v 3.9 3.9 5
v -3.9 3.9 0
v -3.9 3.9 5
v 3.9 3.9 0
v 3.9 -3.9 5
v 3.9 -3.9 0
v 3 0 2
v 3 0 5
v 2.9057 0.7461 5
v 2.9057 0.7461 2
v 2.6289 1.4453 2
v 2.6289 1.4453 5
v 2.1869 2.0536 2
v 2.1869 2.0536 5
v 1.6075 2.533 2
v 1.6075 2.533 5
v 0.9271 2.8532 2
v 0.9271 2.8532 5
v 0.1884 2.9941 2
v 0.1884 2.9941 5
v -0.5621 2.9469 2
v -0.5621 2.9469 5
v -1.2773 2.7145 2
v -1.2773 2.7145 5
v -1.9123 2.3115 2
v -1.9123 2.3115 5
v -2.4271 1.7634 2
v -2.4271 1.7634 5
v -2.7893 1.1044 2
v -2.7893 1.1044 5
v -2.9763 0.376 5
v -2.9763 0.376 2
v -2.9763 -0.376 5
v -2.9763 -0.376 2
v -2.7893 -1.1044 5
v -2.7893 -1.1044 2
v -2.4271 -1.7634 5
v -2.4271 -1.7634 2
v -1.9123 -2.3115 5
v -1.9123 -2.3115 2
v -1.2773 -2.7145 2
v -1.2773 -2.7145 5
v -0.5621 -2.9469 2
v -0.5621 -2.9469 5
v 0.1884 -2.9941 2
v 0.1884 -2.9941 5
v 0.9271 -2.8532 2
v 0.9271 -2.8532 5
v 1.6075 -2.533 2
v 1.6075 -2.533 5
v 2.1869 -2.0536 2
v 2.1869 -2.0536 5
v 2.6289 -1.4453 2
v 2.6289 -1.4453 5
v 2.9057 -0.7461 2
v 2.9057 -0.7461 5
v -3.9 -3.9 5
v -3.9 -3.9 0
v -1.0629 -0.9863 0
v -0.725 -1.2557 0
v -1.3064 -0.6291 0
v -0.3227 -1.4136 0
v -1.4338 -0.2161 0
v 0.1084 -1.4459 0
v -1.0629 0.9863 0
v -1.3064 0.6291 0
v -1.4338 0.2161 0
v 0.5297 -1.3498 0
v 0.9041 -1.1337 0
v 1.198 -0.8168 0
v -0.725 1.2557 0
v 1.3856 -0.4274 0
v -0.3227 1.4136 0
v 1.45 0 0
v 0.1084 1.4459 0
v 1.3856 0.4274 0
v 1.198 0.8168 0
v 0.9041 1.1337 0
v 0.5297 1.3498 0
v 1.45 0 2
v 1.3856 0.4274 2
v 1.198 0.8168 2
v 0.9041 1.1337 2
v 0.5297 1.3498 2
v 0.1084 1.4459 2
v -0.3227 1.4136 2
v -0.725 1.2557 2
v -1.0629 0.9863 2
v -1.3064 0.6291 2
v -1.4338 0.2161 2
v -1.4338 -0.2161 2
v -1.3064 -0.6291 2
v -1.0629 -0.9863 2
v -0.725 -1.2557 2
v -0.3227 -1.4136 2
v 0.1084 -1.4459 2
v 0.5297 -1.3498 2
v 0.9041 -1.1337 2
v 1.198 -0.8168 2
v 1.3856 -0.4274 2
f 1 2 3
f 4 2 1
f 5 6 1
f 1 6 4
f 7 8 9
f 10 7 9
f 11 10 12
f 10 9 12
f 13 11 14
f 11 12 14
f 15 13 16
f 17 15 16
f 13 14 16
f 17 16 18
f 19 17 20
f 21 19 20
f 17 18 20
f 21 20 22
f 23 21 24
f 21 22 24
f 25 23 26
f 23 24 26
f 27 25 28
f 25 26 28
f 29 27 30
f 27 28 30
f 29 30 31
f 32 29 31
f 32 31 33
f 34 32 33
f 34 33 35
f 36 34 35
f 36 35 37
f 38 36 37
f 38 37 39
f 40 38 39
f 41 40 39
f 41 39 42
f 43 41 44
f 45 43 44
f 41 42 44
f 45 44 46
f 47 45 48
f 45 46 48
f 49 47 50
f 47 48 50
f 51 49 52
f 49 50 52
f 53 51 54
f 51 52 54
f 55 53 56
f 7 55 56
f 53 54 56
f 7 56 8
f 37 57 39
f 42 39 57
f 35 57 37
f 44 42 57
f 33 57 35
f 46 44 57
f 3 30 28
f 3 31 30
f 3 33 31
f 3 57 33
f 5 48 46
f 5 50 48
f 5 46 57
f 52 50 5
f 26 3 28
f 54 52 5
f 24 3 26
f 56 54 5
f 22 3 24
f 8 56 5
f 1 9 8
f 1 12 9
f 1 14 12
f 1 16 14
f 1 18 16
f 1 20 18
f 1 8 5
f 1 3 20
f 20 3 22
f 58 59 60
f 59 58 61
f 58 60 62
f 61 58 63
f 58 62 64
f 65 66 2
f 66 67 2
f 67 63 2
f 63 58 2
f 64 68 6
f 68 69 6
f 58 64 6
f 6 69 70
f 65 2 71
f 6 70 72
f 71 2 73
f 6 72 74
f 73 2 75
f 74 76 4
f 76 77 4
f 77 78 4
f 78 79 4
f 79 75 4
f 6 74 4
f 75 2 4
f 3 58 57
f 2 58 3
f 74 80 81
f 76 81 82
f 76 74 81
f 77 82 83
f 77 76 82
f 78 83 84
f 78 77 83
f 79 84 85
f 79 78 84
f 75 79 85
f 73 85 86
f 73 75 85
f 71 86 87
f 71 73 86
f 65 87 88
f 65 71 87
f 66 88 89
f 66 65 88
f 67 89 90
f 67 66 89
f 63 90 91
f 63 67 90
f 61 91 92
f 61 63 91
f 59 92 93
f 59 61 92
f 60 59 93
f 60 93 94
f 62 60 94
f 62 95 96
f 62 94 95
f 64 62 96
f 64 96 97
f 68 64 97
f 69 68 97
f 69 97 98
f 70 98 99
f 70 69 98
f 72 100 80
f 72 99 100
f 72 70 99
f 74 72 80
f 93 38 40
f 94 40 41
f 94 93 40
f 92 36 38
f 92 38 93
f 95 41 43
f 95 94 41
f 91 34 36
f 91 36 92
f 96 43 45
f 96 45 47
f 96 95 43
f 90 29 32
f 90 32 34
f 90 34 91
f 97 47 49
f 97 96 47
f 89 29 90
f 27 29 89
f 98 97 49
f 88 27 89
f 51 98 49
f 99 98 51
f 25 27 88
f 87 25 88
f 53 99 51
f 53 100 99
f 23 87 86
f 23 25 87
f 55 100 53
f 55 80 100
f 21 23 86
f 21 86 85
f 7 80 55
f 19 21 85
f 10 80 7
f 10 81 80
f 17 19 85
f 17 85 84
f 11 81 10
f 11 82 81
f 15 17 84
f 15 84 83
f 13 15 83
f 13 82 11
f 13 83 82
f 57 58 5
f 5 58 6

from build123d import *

# Parameters (mm, degrees)
SKETCH_1_W          = 7.8
SKETCH_1_H          = 7.8
SKETCH_1_R          = 1.45
EXTRUDE_1_DEPTH     = 5
SKETCH_2_R          = 3
CUT_EXTRUDE_1_DEPTH = 3


with BuildPart() as part:
    # Эскиз1 → Бобышка-Вытянуть1 (new body)
    with BuildSketch(Plane.XY):
        Rectangle(SKETCH_1_W, SKETCH_1_H)
        Circle(SKETCH_1_R, mode=Mode.SUBTRACT)
    extrude(amount=EXTRUDE_1_DEPTH)

    # Эскиз2 → Вырез-Вытянуть1 (cut)
    with BuildSketch(Plane.XY.offset(5)):
        Circle(SKETCH_2_R)
    extrude(amount=-CUT_EXTRUDE_1_DEPTH, mode=Mode.SUBTRACT)


solid = part.part
